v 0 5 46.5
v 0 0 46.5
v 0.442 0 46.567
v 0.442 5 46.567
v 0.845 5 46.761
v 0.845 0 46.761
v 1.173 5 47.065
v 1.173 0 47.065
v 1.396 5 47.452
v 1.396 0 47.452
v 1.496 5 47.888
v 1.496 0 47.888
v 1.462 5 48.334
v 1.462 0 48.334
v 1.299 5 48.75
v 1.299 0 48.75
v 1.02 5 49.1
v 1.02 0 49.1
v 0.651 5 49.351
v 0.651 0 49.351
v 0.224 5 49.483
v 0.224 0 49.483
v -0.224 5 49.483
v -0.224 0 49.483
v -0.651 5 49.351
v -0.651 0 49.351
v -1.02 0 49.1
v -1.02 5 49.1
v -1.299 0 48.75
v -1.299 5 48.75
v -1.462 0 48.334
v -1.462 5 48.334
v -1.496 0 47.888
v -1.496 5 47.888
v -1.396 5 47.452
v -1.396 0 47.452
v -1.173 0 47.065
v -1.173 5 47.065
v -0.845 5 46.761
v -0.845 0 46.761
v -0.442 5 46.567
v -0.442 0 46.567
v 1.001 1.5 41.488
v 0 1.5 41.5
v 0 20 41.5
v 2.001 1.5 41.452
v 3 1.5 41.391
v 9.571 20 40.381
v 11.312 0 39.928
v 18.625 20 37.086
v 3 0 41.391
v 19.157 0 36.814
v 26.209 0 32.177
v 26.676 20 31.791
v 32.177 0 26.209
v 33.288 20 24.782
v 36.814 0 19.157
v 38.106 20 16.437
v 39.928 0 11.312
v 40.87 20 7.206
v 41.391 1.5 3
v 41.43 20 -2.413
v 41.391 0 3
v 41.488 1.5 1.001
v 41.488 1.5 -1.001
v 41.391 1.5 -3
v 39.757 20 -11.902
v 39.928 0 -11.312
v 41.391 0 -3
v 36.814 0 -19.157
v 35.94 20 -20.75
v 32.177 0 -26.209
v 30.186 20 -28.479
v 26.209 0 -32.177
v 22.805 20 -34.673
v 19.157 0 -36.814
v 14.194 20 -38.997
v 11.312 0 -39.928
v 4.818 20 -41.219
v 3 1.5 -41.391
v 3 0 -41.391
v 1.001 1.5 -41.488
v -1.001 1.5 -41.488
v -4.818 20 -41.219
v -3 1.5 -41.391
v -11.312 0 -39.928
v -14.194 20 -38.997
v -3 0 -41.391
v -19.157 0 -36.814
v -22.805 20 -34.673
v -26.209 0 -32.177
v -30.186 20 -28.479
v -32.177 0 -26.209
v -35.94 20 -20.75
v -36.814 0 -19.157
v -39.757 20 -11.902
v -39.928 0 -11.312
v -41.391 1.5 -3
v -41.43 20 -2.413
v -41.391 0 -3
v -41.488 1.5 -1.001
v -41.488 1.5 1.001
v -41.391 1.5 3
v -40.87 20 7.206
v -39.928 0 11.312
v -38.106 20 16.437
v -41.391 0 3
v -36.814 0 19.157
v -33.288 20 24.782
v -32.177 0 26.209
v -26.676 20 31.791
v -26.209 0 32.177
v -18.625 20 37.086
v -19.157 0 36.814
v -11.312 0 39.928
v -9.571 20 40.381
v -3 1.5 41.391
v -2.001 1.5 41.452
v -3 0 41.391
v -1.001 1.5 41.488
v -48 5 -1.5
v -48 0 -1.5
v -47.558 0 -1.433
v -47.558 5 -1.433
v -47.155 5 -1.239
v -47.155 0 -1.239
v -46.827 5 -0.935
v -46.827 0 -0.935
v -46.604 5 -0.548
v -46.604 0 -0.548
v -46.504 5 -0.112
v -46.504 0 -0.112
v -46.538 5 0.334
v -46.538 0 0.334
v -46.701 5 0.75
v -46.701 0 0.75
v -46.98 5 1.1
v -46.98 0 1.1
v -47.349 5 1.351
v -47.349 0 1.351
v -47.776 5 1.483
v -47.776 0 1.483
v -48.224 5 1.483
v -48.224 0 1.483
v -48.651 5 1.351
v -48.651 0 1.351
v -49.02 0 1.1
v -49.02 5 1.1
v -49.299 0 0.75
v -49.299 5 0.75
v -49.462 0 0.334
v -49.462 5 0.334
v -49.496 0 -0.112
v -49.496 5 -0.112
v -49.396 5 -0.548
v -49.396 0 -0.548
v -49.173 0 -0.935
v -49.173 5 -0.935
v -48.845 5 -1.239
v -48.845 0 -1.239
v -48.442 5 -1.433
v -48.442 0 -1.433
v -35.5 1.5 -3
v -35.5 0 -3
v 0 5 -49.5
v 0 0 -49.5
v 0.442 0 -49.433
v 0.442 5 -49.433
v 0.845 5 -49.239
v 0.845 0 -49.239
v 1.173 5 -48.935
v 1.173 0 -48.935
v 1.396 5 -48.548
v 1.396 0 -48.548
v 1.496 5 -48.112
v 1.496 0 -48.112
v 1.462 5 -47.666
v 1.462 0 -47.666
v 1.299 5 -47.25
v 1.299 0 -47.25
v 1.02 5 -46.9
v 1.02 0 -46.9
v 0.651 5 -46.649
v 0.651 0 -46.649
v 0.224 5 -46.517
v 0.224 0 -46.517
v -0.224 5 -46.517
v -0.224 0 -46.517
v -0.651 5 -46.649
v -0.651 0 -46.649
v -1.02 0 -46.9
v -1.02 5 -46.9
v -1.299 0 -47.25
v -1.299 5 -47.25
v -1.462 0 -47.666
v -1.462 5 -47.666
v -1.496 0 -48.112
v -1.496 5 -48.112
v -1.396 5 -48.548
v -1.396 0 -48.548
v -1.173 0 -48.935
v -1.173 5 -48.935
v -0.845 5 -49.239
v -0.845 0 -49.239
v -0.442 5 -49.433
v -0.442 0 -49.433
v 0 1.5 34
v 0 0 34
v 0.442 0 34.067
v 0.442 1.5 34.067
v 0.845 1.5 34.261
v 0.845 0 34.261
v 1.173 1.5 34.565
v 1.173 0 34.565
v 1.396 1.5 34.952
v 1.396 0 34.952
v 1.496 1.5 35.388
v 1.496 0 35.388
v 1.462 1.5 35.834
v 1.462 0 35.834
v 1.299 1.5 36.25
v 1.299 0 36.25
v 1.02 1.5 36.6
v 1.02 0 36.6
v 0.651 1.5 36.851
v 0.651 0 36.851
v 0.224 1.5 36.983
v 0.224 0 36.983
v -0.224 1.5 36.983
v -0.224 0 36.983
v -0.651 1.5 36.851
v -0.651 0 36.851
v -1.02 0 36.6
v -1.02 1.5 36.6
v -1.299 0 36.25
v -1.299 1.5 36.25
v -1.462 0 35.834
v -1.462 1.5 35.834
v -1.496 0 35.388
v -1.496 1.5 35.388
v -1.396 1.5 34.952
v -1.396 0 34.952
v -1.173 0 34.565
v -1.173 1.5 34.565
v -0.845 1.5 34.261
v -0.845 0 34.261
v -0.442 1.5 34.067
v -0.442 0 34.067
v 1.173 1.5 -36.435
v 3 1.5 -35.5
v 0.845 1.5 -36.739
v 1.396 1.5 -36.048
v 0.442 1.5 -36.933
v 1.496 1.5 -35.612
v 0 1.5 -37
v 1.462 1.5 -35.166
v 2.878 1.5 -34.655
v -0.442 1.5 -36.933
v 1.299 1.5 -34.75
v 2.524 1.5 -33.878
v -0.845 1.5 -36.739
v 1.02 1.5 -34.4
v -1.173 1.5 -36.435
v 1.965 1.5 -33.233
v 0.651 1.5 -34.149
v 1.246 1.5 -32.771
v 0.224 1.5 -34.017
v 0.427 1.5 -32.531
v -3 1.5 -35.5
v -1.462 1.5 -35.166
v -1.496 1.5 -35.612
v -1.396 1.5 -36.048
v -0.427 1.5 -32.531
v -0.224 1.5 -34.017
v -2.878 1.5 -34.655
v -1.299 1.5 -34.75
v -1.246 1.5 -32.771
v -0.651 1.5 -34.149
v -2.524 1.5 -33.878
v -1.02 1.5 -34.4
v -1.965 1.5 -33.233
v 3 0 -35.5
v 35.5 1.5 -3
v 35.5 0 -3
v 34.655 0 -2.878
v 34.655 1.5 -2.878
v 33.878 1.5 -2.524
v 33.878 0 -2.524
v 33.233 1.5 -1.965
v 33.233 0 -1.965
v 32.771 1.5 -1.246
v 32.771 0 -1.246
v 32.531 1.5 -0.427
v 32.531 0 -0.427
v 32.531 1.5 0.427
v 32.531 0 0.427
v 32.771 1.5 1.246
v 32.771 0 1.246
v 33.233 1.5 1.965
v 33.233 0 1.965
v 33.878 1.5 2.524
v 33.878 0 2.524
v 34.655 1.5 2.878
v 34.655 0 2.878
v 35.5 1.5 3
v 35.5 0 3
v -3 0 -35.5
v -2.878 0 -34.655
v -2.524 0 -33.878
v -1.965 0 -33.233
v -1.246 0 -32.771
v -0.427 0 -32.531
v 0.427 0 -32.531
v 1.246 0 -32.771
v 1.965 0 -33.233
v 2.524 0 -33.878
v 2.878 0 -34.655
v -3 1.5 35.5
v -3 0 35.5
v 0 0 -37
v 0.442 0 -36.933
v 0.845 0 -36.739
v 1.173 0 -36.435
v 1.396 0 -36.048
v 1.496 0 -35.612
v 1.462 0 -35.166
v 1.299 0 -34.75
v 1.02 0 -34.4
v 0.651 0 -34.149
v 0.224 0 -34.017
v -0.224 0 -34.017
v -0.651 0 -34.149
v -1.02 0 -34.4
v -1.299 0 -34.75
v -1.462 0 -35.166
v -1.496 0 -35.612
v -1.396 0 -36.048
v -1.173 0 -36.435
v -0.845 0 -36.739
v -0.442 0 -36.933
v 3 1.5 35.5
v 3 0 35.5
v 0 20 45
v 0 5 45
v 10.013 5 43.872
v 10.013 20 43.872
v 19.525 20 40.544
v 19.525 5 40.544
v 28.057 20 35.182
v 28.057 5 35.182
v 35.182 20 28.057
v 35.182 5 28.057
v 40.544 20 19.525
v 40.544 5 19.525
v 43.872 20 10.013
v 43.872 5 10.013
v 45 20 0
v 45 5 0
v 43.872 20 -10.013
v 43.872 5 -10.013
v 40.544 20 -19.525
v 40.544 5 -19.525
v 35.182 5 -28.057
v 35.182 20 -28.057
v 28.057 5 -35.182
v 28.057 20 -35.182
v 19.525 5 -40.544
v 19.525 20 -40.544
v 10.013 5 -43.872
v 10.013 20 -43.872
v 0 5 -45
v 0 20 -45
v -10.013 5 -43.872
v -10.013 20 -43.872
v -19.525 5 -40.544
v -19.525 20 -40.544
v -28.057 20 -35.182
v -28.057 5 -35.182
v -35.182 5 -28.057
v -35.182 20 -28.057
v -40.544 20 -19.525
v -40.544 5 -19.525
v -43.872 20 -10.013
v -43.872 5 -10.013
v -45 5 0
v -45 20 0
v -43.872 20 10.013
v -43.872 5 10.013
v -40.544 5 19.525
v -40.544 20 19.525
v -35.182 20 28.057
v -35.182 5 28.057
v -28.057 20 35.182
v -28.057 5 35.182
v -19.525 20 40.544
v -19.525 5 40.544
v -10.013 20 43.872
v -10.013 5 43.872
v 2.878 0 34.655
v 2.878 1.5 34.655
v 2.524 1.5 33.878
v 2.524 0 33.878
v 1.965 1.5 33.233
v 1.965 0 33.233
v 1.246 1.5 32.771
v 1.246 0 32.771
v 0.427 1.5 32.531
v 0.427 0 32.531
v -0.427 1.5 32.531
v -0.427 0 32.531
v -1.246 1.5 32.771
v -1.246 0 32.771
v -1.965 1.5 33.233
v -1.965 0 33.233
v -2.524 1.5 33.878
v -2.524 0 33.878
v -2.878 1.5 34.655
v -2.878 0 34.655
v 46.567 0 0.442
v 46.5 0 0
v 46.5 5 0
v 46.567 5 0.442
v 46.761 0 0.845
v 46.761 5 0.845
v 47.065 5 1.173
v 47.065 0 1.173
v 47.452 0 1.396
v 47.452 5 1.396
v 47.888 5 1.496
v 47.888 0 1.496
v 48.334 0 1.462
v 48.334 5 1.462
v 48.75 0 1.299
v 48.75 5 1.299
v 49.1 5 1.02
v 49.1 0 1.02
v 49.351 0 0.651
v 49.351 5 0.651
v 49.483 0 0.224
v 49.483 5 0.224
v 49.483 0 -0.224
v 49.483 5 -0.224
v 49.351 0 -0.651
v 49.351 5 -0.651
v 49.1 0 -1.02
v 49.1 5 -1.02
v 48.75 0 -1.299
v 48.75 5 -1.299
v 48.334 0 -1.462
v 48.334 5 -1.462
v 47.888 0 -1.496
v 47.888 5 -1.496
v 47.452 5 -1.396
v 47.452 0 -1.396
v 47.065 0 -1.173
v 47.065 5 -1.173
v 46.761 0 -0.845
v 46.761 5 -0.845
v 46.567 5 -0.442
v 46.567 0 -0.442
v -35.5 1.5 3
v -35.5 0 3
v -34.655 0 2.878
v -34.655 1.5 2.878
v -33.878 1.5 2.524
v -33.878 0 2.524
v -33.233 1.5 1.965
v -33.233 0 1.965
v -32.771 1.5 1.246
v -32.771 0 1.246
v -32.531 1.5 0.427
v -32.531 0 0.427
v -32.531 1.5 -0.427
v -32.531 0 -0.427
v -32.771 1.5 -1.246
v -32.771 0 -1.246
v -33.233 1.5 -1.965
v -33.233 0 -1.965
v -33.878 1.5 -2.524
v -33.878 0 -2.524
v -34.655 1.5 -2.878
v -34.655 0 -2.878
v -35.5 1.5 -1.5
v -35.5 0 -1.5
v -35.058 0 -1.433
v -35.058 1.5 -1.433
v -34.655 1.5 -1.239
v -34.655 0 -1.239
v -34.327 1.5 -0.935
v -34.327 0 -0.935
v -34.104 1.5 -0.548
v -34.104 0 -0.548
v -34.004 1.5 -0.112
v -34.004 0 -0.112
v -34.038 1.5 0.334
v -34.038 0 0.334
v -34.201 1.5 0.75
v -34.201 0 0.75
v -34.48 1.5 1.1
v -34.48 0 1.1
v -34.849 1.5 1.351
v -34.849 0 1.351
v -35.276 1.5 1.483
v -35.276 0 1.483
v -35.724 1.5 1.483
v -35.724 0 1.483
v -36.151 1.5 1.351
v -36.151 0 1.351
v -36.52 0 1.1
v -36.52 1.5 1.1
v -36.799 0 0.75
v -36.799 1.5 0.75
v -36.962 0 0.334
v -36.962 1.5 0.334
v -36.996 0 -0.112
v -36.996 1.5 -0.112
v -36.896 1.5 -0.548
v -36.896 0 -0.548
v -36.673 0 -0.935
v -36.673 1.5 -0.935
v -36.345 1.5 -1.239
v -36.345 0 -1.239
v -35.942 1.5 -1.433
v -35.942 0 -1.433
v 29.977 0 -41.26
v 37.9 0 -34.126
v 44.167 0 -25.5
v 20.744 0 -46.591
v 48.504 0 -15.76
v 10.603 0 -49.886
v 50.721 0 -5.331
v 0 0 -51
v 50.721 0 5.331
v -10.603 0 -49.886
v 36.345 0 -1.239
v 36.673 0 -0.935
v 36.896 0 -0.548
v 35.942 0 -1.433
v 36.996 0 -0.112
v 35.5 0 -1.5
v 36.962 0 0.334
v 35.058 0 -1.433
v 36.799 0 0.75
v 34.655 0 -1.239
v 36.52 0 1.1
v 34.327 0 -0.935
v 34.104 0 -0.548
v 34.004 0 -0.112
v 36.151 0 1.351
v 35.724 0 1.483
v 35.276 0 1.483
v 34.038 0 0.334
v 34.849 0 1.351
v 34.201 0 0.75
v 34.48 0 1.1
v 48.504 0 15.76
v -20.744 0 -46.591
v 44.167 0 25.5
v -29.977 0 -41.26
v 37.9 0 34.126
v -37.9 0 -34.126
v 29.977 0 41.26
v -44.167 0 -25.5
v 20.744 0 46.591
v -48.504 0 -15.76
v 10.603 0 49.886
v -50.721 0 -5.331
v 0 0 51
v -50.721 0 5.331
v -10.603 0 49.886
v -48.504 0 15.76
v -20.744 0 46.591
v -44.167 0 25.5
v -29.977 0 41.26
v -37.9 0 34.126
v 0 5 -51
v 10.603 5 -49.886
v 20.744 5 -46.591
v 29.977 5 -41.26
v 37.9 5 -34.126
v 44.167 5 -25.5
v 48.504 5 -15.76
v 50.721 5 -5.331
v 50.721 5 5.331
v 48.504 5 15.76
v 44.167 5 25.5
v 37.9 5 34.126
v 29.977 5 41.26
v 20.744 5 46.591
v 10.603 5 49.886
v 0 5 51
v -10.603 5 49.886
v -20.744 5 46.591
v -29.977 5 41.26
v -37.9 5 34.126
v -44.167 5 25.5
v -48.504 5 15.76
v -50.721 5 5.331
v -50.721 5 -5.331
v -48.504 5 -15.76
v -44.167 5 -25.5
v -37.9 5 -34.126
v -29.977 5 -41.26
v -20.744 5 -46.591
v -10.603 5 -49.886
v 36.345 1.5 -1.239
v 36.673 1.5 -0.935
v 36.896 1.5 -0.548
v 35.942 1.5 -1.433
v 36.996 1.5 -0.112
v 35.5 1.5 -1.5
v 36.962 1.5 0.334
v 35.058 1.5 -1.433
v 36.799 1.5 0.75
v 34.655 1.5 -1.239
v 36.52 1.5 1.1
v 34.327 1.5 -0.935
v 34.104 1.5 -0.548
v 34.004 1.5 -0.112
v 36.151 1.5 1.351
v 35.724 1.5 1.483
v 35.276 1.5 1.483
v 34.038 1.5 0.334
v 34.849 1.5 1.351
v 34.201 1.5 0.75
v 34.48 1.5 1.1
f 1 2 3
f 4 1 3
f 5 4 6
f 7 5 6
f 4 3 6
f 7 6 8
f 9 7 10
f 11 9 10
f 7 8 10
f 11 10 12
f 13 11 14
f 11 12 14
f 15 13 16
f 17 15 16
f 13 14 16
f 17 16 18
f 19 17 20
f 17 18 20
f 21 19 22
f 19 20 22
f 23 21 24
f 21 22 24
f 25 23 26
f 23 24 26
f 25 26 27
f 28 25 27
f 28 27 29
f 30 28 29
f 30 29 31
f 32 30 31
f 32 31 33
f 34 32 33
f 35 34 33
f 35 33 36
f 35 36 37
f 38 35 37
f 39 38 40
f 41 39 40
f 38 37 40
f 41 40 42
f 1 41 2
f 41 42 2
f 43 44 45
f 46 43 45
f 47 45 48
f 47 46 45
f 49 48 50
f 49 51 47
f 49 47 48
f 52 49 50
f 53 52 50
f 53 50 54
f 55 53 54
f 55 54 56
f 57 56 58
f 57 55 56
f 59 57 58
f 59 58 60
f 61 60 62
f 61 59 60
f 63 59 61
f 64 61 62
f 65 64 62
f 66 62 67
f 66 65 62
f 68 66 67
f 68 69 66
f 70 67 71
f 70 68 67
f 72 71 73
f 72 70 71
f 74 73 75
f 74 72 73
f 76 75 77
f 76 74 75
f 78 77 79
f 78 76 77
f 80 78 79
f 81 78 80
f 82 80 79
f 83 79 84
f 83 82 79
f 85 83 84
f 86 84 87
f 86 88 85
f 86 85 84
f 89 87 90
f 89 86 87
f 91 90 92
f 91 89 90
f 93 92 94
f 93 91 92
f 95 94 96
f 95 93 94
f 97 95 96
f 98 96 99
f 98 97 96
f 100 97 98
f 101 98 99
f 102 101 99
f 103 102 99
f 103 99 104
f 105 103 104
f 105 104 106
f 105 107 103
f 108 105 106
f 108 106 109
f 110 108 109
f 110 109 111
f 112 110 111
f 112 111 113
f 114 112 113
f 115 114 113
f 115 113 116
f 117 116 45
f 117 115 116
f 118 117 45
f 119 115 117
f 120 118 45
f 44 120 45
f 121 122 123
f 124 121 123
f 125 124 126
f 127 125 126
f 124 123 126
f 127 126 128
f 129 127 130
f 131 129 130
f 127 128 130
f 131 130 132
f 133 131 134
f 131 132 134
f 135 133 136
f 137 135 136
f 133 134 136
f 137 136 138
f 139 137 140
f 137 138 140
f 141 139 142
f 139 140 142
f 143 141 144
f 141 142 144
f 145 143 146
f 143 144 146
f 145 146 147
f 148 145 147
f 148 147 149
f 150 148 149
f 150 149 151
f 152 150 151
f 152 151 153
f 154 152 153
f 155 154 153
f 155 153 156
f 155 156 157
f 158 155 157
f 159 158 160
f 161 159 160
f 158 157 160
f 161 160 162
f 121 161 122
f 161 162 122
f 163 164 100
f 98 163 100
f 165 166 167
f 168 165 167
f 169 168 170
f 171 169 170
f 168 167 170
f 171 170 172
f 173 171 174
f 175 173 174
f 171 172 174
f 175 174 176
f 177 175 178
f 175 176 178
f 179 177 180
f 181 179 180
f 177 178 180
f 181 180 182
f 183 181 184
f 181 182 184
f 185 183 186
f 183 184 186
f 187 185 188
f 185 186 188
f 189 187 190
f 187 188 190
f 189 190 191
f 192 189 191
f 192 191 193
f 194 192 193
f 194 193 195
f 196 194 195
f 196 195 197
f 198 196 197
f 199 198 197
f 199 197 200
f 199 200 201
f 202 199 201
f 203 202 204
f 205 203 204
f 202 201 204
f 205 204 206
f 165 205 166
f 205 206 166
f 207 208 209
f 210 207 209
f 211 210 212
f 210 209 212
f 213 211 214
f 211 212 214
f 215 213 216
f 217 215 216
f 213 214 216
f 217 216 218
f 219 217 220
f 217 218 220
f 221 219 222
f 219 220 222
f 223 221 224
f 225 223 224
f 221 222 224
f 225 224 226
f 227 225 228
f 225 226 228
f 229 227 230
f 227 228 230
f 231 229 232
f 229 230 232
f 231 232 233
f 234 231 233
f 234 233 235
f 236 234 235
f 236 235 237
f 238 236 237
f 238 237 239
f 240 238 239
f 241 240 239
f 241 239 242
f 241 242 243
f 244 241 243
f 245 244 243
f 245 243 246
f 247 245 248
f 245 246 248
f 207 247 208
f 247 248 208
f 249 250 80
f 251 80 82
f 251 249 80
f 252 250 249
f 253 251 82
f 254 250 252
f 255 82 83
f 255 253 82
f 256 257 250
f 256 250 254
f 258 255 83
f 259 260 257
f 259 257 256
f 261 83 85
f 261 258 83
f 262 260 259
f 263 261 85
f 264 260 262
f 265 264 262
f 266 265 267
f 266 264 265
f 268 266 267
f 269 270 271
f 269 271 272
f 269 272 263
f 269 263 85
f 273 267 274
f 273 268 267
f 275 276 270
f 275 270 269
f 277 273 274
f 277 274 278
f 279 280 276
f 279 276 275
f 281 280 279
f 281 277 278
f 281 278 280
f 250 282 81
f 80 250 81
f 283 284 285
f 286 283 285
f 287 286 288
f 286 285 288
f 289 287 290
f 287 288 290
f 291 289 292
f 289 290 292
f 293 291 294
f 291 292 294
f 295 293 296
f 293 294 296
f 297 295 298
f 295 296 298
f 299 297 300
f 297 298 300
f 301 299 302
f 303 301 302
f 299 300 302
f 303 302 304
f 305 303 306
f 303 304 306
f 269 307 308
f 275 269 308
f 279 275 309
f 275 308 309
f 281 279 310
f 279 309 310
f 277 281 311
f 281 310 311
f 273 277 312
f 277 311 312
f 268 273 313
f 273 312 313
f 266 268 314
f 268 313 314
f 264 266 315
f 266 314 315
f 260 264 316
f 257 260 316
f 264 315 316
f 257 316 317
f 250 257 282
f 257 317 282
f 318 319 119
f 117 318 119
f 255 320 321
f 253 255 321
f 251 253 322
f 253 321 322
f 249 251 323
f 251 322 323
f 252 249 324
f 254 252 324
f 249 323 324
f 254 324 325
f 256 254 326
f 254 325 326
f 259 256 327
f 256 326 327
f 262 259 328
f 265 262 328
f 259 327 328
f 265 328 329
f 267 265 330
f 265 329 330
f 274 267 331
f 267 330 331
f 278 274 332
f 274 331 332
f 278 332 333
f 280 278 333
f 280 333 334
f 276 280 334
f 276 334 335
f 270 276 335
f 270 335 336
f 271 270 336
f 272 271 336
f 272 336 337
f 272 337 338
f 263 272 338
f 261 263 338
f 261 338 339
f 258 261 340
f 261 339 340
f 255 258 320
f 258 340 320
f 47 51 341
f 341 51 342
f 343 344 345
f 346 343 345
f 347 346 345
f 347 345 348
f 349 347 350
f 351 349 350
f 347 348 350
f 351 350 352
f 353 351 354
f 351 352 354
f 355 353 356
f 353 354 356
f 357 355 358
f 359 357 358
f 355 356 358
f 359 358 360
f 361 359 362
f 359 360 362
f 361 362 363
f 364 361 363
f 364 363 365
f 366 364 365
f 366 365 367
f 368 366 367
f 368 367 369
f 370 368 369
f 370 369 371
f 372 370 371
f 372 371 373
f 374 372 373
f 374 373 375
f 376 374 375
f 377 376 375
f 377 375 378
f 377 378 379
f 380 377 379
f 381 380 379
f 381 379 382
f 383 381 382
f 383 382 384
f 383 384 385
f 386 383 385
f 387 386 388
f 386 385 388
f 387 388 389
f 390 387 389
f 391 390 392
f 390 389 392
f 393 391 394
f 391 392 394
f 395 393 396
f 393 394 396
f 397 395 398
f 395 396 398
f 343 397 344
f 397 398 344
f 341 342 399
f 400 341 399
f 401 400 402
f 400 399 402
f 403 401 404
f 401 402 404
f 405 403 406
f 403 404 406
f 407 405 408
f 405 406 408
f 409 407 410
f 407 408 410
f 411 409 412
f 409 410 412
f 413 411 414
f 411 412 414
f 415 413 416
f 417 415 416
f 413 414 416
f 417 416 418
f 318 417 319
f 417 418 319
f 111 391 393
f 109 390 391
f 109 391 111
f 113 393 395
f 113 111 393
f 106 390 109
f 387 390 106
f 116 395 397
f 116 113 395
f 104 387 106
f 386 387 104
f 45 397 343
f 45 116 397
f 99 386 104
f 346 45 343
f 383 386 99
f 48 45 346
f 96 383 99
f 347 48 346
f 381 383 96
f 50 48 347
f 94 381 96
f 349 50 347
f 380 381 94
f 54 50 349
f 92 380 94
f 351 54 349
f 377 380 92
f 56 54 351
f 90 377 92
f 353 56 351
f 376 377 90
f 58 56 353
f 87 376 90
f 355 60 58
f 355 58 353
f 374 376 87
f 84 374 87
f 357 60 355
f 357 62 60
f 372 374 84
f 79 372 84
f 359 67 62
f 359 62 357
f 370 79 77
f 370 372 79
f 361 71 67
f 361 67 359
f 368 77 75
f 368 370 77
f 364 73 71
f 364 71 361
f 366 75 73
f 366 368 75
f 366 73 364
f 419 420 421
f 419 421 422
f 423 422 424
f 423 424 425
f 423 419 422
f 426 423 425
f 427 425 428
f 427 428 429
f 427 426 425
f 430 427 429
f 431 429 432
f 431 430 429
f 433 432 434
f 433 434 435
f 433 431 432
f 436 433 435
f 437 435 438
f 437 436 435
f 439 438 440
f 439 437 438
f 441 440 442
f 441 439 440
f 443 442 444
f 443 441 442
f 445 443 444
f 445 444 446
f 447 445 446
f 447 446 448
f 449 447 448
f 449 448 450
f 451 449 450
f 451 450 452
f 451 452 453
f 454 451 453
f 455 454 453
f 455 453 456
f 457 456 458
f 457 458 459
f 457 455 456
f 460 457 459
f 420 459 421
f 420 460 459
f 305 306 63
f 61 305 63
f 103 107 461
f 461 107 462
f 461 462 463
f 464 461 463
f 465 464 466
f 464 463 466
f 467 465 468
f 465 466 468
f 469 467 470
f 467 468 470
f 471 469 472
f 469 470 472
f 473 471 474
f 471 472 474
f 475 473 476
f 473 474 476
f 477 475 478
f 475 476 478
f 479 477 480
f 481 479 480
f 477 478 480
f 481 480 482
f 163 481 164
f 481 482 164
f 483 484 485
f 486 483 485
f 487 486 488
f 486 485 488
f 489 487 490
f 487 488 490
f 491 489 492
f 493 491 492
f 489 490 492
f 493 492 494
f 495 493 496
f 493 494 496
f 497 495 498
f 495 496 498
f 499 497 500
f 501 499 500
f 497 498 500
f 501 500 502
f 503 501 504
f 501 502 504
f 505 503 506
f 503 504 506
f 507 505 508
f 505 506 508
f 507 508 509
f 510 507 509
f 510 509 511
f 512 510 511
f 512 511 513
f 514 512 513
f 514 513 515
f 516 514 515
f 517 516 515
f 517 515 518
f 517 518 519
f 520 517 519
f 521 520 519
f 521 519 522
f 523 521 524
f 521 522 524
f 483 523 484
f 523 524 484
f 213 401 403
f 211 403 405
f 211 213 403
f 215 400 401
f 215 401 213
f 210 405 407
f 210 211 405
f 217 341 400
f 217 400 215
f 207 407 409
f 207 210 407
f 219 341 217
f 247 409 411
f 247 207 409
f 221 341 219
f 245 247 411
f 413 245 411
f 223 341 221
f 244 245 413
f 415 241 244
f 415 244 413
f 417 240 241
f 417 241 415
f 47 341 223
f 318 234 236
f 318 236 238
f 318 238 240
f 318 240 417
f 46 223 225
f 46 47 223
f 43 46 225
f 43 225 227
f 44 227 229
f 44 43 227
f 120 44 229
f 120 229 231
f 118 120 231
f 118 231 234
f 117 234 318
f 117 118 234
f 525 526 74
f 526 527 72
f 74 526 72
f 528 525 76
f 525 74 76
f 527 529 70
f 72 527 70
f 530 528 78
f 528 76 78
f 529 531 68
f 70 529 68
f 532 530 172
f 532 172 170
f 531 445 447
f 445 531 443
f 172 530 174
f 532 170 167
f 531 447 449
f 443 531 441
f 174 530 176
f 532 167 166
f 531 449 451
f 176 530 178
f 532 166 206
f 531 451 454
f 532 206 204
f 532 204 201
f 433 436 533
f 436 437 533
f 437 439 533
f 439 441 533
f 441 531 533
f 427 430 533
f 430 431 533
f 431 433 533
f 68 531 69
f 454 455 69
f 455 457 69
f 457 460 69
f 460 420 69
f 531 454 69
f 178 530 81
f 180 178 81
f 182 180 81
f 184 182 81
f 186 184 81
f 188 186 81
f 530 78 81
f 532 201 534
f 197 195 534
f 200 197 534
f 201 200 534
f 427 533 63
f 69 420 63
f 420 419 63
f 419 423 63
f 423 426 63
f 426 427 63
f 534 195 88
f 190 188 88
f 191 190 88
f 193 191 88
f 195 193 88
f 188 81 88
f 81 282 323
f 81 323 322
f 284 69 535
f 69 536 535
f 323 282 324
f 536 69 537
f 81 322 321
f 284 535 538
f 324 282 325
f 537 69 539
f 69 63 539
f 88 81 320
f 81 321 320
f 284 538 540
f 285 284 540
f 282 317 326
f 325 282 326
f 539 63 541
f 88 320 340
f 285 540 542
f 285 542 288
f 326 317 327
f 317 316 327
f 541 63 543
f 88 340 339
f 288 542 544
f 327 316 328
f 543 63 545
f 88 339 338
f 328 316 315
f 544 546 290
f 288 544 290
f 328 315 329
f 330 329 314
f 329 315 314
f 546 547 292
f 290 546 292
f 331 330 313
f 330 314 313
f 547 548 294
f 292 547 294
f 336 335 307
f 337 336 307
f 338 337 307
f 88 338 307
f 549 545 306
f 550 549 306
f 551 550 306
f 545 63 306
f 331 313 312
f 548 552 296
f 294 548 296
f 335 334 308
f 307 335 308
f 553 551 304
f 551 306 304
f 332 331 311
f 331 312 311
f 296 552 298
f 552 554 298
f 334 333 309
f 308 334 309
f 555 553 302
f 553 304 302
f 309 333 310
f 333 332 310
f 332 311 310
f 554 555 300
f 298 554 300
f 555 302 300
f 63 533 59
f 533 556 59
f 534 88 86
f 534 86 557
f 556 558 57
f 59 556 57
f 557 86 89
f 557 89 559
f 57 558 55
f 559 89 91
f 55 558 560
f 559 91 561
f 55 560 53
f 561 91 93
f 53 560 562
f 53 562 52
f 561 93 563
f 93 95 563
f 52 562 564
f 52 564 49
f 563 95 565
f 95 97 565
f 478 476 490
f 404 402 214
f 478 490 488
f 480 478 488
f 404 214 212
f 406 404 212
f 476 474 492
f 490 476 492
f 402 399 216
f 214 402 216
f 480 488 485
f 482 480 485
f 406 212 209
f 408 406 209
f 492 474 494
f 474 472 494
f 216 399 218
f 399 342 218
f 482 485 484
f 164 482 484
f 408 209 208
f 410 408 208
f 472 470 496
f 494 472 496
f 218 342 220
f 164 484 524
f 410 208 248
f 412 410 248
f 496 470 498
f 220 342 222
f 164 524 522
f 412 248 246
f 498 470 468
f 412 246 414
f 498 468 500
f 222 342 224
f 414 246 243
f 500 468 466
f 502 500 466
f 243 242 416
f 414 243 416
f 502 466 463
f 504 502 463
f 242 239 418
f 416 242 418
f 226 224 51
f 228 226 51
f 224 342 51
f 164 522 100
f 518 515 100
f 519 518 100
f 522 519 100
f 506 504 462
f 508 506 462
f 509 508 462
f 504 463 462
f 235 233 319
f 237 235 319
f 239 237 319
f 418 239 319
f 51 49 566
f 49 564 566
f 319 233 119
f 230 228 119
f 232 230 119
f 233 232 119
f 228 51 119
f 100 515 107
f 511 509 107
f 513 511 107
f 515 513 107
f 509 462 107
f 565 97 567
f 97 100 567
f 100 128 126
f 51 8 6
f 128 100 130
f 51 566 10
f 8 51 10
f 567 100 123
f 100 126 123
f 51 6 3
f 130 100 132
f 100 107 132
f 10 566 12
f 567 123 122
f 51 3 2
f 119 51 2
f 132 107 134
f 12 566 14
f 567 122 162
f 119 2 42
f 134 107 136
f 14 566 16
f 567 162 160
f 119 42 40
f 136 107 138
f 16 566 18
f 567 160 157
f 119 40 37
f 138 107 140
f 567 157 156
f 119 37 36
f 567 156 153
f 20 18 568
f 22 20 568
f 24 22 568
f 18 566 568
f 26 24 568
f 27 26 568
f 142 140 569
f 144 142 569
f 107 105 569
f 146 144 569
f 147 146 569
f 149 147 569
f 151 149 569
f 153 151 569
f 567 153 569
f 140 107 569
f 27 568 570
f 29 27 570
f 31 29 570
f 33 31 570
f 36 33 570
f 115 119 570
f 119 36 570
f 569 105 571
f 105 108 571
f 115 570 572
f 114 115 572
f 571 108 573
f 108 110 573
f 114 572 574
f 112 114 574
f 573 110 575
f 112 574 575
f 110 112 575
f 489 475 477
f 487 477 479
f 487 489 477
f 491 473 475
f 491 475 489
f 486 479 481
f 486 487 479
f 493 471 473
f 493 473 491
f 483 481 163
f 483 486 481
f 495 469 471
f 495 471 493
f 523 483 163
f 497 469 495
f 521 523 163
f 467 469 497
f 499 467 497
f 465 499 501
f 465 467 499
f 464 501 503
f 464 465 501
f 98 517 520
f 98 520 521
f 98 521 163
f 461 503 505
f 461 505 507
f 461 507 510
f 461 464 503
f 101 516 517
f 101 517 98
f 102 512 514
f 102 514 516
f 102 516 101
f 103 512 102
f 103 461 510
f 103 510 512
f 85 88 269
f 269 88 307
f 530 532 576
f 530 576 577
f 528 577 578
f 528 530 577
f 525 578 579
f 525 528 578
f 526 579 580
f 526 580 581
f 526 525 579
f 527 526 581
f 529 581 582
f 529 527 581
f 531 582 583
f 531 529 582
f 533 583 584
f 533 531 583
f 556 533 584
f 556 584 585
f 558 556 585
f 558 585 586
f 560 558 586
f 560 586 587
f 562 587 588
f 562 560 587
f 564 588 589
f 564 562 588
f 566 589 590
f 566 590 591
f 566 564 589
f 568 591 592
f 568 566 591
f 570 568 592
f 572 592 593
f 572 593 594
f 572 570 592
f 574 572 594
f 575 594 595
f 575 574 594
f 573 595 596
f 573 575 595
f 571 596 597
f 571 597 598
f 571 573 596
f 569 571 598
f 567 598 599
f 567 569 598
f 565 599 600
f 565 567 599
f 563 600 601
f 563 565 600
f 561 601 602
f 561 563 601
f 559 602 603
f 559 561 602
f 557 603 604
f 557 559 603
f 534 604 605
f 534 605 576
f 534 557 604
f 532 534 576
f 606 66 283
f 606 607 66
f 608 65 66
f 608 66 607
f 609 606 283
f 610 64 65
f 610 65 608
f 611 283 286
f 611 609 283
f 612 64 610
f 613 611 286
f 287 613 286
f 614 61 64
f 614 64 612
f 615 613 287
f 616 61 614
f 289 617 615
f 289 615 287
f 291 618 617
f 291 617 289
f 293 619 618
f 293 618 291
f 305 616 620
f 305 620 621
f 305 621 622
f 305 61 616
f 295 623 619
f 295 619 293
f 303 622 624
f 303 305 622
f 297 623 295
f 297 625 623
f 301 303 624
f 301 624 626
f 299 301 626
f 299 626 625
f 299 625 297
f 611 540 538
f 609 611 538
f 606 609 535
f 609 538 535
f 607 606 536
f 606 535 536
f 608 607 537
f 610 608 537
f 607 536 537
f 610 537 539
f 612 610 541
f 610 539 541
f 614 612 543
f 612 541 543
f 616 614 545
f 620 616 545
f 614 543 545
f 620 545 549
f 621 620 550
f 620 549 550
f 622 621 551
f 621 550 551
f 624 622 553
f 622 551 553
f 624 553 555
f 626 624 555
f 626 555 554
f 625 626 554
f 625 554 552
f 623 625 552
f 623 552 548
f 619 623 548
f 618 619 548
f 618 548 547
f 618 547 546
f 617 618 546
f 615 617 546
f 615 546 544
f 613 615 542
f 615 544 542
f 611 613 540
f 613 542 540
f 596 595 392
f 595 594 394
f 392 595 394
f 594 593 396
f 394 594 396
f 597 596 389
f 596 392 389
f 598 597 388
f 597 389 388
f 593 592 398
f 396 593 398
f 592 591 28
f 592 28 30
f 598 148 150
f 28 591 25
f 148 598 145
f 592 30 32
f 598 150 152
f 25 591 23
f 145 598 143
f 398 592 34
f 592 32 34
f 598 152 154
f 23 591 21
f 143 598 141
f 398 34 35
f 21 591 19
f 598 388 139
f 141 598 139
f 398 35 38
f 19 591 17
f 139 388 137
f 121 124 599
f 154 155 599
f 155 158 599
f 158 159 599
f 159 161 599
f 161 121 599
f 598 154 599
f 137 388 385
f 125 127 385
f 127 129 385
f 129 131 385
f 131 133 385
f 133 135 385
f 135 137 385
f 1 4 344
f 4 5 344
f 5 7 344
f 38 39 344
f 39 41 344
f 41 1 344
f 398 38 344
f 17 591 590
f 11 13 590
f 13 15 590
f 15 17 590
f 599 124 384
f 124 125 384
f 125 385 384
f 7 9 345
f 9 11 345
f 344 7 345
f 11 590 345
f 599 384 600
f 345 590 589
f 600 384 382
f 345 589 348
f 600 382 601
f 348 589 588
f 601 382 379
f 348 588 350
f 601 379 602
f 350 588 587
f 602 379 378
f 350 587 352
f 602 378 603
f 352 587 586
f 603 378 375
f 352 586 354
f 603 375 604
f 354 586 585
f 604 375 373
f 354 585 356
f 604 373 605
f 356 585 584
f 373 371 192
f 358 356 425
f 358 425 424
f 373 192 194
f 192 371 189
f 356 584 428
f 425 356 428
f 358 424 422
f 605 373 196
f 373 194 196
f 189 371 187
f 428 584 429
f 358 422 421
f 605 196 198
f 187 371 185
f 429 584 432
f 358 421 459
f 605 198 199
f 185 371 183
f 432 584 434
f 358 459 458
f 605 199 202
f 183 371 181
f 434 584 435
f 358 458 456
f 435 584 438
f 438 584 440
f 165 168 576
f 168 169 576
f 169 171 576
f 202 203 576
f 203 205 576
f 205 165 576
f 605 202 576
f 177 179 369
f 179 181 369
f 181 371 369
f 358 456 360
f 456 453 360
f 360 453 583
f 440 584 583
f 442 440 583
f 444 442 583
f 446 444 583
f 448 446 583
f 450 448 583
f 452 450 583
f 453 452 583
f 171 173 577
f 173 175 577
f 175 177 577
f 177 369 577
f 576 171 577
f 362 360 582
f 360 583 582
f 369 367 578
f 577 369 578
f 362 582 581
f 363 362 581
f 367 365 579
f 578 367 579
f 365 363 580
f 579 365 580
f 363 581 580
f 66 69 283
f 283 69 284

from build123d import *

# Parameters (mm, degrees)
SKETCH1_R           = 45
SKETCH1_R_2         = 42
BOSS_EXTRUDE1_DEPTH = 20
SKETCH2_R           = 51
SKETCH2_R_2         = 1.5
SKETCH2_R_3         = 45
BOSS_EXTRUDE2_DEPTH = 5
BOSS_EXTRUDE3_START = -20
SKETCH3_R           = 42
SKETCH3_R_2         = 41.5
BOSS_EXTRUDE3_DEPTH = 20
SKETCH5_R           = 1.5
BOSS_EXTRUDE4_DEPTH = 1.5


with BuildPart() as part:
    # Sketch1 → Boss-Extrude1 (new body)
    with BuildSketch(Plane(origin=(0, 0, 0), x_dir=(1, 0, 0), z_dir=(0, 1, 0))):
        with Locations(Location((0, 0, 0), (0, 0, 270))):
            Circle(SKETCH1_R)
        with Locations(Location((0, 0, 0), (0, 0, 270))):
            Circle(SKETCH1_R_2, mode=Mode.SUBTRACT)
    extrude(amount=BOSS_EXTRUDE1_DEPTH)

    # Sketch2 → Boss-Extrude2 (add)
    with BuildSketch(Plane.XZ):
        with Locations(Location((0, 0, 0), (0, 0, 270))):
            Circle(SKETCH2_R)
        with Locations(Location((0, -48, 0), (0, 0, 270))):
            Circle(SKETCH2_R_2, mode=Mode.SUBTRACT)
        with Locations(Location((-48, 0, 0), (0, 0, 270))):
            Circle(SKETCH2_R_2, mode=Mode.SUBTRACT)
        with Locations(Location((0, 0, 0), (0, 0, 270))):
            Circle(SKETCH2_R_3, mode=Mode.SUBTRACT)
        with BuildLine():
            ThreePointArc((49.5, 0), (48, -1.5), (46.5, 0))
            ThreePointArc((46.5, 0), (48, 1.5), (49.5, 0))
        make_face(mode=Mode.SUBTRACT)
        with Locations(Location((0, 48, 0), (0, 0, 270))):
            Circle(SKETCH2_R_2, mode=Mode.SUBTRACT)
    extrude(amount=-BOSS_EXTRUDE2_DEPTH)

    # Sketch3 → Boss-Extrude3 (add)
    with BuildSketch(Plane(origin=(0, 20, 0), x_dir=(1, 0, 0), z_dir=(0, 1, 0)).offset(BOSS_EXTRUDE3_START)):
        Circle(SKETCH3_R)
        with Locations(Location((0, 0, 0), (0, 0, 270))):
            Circle(SKETCH3_R_2, mode=Mode.SUBTRACT)
    extrude(amount=BOSS_EXTRUDE3_DEPTH)

    # Sketch5 → Boss-Extrude4 (add)
    # profile 1 of 4: a face of its own
    with BuildSketch(Plane.XZ):
        with BuildLine():
            Line((35.5, 3), (42.194384288, 3))
            Line((42.194384288, 3), (42.194384288, -3))
            Line((42.194384288, -3), (35.5, -3))
            ThreePointArc((35.5, -3), (32.5, 0), (35.5, 3))
        make_face()
        with Locations(Location((35.5, 0, 0), (0, 0, 270))):
            Circle(SKETCH5_R, mode=Mode.SUBTRACT)
    # profile 2 of 4: a face of its own
    with BuildSketch(Plane.XZ):
        with BuildLine():
            Line((-3, 35.5), (-3, 42.194384288))
            Line((-3, 42.194384288), (3, 42.194384288))
            Line((3, 42.194384288), (3, 35.5))
            ThreePointArc((3, 35.5), (0, 32.5), (-3, 35.5))
        make_face()
        with Locations(Location((0, 35.5, 0), (0, 0, 270))):
            Circle(SKETCH5_R, mode=Mode.SUBTRACT)
    # profile 3 of 4: a face of its own
    with BuildSketch(Plane.XZ):
        with BuildLine():
            Line((3, -35.5), (3, -42.194384288))
            Line((3, -42.194384288), (-3, -42.194384288))
            Line((-3, -42.194384288), (-3, -35.5))
            ThreePointArc((-3, -35.5), (0, -32.5), (3, -35.5))
        make_face()
        with Locations(Location((0, -35.5, 0), (0, 0, 270))):
            Circle(SKETCH5_R, mode=Mode.SUBTRACT)
    # profile 4 of 4: a face of its own
    with BuildSketch(Plane.XZ):
        with BuildLine():
            Line((-35.5, -3), (-42.194384288, -3))
            Line((-42.194384288, -3), (-42.194384288, 3))
            Line((-42.194384288, 3), (-35.5, 3))
            ThreePointArc((-35.5, 3), (-32.5, 0), (-35.5, -3))
        make_face()
        with Locations(Location((-35.5, 0, 0), (0, 0, 270))):
            Circle(SKETCH5_R, mode=Mode.SUBTRACT)
    extrude(amount=-BOSS_EXTRUDE4_DEPTH)


solid = part.part
